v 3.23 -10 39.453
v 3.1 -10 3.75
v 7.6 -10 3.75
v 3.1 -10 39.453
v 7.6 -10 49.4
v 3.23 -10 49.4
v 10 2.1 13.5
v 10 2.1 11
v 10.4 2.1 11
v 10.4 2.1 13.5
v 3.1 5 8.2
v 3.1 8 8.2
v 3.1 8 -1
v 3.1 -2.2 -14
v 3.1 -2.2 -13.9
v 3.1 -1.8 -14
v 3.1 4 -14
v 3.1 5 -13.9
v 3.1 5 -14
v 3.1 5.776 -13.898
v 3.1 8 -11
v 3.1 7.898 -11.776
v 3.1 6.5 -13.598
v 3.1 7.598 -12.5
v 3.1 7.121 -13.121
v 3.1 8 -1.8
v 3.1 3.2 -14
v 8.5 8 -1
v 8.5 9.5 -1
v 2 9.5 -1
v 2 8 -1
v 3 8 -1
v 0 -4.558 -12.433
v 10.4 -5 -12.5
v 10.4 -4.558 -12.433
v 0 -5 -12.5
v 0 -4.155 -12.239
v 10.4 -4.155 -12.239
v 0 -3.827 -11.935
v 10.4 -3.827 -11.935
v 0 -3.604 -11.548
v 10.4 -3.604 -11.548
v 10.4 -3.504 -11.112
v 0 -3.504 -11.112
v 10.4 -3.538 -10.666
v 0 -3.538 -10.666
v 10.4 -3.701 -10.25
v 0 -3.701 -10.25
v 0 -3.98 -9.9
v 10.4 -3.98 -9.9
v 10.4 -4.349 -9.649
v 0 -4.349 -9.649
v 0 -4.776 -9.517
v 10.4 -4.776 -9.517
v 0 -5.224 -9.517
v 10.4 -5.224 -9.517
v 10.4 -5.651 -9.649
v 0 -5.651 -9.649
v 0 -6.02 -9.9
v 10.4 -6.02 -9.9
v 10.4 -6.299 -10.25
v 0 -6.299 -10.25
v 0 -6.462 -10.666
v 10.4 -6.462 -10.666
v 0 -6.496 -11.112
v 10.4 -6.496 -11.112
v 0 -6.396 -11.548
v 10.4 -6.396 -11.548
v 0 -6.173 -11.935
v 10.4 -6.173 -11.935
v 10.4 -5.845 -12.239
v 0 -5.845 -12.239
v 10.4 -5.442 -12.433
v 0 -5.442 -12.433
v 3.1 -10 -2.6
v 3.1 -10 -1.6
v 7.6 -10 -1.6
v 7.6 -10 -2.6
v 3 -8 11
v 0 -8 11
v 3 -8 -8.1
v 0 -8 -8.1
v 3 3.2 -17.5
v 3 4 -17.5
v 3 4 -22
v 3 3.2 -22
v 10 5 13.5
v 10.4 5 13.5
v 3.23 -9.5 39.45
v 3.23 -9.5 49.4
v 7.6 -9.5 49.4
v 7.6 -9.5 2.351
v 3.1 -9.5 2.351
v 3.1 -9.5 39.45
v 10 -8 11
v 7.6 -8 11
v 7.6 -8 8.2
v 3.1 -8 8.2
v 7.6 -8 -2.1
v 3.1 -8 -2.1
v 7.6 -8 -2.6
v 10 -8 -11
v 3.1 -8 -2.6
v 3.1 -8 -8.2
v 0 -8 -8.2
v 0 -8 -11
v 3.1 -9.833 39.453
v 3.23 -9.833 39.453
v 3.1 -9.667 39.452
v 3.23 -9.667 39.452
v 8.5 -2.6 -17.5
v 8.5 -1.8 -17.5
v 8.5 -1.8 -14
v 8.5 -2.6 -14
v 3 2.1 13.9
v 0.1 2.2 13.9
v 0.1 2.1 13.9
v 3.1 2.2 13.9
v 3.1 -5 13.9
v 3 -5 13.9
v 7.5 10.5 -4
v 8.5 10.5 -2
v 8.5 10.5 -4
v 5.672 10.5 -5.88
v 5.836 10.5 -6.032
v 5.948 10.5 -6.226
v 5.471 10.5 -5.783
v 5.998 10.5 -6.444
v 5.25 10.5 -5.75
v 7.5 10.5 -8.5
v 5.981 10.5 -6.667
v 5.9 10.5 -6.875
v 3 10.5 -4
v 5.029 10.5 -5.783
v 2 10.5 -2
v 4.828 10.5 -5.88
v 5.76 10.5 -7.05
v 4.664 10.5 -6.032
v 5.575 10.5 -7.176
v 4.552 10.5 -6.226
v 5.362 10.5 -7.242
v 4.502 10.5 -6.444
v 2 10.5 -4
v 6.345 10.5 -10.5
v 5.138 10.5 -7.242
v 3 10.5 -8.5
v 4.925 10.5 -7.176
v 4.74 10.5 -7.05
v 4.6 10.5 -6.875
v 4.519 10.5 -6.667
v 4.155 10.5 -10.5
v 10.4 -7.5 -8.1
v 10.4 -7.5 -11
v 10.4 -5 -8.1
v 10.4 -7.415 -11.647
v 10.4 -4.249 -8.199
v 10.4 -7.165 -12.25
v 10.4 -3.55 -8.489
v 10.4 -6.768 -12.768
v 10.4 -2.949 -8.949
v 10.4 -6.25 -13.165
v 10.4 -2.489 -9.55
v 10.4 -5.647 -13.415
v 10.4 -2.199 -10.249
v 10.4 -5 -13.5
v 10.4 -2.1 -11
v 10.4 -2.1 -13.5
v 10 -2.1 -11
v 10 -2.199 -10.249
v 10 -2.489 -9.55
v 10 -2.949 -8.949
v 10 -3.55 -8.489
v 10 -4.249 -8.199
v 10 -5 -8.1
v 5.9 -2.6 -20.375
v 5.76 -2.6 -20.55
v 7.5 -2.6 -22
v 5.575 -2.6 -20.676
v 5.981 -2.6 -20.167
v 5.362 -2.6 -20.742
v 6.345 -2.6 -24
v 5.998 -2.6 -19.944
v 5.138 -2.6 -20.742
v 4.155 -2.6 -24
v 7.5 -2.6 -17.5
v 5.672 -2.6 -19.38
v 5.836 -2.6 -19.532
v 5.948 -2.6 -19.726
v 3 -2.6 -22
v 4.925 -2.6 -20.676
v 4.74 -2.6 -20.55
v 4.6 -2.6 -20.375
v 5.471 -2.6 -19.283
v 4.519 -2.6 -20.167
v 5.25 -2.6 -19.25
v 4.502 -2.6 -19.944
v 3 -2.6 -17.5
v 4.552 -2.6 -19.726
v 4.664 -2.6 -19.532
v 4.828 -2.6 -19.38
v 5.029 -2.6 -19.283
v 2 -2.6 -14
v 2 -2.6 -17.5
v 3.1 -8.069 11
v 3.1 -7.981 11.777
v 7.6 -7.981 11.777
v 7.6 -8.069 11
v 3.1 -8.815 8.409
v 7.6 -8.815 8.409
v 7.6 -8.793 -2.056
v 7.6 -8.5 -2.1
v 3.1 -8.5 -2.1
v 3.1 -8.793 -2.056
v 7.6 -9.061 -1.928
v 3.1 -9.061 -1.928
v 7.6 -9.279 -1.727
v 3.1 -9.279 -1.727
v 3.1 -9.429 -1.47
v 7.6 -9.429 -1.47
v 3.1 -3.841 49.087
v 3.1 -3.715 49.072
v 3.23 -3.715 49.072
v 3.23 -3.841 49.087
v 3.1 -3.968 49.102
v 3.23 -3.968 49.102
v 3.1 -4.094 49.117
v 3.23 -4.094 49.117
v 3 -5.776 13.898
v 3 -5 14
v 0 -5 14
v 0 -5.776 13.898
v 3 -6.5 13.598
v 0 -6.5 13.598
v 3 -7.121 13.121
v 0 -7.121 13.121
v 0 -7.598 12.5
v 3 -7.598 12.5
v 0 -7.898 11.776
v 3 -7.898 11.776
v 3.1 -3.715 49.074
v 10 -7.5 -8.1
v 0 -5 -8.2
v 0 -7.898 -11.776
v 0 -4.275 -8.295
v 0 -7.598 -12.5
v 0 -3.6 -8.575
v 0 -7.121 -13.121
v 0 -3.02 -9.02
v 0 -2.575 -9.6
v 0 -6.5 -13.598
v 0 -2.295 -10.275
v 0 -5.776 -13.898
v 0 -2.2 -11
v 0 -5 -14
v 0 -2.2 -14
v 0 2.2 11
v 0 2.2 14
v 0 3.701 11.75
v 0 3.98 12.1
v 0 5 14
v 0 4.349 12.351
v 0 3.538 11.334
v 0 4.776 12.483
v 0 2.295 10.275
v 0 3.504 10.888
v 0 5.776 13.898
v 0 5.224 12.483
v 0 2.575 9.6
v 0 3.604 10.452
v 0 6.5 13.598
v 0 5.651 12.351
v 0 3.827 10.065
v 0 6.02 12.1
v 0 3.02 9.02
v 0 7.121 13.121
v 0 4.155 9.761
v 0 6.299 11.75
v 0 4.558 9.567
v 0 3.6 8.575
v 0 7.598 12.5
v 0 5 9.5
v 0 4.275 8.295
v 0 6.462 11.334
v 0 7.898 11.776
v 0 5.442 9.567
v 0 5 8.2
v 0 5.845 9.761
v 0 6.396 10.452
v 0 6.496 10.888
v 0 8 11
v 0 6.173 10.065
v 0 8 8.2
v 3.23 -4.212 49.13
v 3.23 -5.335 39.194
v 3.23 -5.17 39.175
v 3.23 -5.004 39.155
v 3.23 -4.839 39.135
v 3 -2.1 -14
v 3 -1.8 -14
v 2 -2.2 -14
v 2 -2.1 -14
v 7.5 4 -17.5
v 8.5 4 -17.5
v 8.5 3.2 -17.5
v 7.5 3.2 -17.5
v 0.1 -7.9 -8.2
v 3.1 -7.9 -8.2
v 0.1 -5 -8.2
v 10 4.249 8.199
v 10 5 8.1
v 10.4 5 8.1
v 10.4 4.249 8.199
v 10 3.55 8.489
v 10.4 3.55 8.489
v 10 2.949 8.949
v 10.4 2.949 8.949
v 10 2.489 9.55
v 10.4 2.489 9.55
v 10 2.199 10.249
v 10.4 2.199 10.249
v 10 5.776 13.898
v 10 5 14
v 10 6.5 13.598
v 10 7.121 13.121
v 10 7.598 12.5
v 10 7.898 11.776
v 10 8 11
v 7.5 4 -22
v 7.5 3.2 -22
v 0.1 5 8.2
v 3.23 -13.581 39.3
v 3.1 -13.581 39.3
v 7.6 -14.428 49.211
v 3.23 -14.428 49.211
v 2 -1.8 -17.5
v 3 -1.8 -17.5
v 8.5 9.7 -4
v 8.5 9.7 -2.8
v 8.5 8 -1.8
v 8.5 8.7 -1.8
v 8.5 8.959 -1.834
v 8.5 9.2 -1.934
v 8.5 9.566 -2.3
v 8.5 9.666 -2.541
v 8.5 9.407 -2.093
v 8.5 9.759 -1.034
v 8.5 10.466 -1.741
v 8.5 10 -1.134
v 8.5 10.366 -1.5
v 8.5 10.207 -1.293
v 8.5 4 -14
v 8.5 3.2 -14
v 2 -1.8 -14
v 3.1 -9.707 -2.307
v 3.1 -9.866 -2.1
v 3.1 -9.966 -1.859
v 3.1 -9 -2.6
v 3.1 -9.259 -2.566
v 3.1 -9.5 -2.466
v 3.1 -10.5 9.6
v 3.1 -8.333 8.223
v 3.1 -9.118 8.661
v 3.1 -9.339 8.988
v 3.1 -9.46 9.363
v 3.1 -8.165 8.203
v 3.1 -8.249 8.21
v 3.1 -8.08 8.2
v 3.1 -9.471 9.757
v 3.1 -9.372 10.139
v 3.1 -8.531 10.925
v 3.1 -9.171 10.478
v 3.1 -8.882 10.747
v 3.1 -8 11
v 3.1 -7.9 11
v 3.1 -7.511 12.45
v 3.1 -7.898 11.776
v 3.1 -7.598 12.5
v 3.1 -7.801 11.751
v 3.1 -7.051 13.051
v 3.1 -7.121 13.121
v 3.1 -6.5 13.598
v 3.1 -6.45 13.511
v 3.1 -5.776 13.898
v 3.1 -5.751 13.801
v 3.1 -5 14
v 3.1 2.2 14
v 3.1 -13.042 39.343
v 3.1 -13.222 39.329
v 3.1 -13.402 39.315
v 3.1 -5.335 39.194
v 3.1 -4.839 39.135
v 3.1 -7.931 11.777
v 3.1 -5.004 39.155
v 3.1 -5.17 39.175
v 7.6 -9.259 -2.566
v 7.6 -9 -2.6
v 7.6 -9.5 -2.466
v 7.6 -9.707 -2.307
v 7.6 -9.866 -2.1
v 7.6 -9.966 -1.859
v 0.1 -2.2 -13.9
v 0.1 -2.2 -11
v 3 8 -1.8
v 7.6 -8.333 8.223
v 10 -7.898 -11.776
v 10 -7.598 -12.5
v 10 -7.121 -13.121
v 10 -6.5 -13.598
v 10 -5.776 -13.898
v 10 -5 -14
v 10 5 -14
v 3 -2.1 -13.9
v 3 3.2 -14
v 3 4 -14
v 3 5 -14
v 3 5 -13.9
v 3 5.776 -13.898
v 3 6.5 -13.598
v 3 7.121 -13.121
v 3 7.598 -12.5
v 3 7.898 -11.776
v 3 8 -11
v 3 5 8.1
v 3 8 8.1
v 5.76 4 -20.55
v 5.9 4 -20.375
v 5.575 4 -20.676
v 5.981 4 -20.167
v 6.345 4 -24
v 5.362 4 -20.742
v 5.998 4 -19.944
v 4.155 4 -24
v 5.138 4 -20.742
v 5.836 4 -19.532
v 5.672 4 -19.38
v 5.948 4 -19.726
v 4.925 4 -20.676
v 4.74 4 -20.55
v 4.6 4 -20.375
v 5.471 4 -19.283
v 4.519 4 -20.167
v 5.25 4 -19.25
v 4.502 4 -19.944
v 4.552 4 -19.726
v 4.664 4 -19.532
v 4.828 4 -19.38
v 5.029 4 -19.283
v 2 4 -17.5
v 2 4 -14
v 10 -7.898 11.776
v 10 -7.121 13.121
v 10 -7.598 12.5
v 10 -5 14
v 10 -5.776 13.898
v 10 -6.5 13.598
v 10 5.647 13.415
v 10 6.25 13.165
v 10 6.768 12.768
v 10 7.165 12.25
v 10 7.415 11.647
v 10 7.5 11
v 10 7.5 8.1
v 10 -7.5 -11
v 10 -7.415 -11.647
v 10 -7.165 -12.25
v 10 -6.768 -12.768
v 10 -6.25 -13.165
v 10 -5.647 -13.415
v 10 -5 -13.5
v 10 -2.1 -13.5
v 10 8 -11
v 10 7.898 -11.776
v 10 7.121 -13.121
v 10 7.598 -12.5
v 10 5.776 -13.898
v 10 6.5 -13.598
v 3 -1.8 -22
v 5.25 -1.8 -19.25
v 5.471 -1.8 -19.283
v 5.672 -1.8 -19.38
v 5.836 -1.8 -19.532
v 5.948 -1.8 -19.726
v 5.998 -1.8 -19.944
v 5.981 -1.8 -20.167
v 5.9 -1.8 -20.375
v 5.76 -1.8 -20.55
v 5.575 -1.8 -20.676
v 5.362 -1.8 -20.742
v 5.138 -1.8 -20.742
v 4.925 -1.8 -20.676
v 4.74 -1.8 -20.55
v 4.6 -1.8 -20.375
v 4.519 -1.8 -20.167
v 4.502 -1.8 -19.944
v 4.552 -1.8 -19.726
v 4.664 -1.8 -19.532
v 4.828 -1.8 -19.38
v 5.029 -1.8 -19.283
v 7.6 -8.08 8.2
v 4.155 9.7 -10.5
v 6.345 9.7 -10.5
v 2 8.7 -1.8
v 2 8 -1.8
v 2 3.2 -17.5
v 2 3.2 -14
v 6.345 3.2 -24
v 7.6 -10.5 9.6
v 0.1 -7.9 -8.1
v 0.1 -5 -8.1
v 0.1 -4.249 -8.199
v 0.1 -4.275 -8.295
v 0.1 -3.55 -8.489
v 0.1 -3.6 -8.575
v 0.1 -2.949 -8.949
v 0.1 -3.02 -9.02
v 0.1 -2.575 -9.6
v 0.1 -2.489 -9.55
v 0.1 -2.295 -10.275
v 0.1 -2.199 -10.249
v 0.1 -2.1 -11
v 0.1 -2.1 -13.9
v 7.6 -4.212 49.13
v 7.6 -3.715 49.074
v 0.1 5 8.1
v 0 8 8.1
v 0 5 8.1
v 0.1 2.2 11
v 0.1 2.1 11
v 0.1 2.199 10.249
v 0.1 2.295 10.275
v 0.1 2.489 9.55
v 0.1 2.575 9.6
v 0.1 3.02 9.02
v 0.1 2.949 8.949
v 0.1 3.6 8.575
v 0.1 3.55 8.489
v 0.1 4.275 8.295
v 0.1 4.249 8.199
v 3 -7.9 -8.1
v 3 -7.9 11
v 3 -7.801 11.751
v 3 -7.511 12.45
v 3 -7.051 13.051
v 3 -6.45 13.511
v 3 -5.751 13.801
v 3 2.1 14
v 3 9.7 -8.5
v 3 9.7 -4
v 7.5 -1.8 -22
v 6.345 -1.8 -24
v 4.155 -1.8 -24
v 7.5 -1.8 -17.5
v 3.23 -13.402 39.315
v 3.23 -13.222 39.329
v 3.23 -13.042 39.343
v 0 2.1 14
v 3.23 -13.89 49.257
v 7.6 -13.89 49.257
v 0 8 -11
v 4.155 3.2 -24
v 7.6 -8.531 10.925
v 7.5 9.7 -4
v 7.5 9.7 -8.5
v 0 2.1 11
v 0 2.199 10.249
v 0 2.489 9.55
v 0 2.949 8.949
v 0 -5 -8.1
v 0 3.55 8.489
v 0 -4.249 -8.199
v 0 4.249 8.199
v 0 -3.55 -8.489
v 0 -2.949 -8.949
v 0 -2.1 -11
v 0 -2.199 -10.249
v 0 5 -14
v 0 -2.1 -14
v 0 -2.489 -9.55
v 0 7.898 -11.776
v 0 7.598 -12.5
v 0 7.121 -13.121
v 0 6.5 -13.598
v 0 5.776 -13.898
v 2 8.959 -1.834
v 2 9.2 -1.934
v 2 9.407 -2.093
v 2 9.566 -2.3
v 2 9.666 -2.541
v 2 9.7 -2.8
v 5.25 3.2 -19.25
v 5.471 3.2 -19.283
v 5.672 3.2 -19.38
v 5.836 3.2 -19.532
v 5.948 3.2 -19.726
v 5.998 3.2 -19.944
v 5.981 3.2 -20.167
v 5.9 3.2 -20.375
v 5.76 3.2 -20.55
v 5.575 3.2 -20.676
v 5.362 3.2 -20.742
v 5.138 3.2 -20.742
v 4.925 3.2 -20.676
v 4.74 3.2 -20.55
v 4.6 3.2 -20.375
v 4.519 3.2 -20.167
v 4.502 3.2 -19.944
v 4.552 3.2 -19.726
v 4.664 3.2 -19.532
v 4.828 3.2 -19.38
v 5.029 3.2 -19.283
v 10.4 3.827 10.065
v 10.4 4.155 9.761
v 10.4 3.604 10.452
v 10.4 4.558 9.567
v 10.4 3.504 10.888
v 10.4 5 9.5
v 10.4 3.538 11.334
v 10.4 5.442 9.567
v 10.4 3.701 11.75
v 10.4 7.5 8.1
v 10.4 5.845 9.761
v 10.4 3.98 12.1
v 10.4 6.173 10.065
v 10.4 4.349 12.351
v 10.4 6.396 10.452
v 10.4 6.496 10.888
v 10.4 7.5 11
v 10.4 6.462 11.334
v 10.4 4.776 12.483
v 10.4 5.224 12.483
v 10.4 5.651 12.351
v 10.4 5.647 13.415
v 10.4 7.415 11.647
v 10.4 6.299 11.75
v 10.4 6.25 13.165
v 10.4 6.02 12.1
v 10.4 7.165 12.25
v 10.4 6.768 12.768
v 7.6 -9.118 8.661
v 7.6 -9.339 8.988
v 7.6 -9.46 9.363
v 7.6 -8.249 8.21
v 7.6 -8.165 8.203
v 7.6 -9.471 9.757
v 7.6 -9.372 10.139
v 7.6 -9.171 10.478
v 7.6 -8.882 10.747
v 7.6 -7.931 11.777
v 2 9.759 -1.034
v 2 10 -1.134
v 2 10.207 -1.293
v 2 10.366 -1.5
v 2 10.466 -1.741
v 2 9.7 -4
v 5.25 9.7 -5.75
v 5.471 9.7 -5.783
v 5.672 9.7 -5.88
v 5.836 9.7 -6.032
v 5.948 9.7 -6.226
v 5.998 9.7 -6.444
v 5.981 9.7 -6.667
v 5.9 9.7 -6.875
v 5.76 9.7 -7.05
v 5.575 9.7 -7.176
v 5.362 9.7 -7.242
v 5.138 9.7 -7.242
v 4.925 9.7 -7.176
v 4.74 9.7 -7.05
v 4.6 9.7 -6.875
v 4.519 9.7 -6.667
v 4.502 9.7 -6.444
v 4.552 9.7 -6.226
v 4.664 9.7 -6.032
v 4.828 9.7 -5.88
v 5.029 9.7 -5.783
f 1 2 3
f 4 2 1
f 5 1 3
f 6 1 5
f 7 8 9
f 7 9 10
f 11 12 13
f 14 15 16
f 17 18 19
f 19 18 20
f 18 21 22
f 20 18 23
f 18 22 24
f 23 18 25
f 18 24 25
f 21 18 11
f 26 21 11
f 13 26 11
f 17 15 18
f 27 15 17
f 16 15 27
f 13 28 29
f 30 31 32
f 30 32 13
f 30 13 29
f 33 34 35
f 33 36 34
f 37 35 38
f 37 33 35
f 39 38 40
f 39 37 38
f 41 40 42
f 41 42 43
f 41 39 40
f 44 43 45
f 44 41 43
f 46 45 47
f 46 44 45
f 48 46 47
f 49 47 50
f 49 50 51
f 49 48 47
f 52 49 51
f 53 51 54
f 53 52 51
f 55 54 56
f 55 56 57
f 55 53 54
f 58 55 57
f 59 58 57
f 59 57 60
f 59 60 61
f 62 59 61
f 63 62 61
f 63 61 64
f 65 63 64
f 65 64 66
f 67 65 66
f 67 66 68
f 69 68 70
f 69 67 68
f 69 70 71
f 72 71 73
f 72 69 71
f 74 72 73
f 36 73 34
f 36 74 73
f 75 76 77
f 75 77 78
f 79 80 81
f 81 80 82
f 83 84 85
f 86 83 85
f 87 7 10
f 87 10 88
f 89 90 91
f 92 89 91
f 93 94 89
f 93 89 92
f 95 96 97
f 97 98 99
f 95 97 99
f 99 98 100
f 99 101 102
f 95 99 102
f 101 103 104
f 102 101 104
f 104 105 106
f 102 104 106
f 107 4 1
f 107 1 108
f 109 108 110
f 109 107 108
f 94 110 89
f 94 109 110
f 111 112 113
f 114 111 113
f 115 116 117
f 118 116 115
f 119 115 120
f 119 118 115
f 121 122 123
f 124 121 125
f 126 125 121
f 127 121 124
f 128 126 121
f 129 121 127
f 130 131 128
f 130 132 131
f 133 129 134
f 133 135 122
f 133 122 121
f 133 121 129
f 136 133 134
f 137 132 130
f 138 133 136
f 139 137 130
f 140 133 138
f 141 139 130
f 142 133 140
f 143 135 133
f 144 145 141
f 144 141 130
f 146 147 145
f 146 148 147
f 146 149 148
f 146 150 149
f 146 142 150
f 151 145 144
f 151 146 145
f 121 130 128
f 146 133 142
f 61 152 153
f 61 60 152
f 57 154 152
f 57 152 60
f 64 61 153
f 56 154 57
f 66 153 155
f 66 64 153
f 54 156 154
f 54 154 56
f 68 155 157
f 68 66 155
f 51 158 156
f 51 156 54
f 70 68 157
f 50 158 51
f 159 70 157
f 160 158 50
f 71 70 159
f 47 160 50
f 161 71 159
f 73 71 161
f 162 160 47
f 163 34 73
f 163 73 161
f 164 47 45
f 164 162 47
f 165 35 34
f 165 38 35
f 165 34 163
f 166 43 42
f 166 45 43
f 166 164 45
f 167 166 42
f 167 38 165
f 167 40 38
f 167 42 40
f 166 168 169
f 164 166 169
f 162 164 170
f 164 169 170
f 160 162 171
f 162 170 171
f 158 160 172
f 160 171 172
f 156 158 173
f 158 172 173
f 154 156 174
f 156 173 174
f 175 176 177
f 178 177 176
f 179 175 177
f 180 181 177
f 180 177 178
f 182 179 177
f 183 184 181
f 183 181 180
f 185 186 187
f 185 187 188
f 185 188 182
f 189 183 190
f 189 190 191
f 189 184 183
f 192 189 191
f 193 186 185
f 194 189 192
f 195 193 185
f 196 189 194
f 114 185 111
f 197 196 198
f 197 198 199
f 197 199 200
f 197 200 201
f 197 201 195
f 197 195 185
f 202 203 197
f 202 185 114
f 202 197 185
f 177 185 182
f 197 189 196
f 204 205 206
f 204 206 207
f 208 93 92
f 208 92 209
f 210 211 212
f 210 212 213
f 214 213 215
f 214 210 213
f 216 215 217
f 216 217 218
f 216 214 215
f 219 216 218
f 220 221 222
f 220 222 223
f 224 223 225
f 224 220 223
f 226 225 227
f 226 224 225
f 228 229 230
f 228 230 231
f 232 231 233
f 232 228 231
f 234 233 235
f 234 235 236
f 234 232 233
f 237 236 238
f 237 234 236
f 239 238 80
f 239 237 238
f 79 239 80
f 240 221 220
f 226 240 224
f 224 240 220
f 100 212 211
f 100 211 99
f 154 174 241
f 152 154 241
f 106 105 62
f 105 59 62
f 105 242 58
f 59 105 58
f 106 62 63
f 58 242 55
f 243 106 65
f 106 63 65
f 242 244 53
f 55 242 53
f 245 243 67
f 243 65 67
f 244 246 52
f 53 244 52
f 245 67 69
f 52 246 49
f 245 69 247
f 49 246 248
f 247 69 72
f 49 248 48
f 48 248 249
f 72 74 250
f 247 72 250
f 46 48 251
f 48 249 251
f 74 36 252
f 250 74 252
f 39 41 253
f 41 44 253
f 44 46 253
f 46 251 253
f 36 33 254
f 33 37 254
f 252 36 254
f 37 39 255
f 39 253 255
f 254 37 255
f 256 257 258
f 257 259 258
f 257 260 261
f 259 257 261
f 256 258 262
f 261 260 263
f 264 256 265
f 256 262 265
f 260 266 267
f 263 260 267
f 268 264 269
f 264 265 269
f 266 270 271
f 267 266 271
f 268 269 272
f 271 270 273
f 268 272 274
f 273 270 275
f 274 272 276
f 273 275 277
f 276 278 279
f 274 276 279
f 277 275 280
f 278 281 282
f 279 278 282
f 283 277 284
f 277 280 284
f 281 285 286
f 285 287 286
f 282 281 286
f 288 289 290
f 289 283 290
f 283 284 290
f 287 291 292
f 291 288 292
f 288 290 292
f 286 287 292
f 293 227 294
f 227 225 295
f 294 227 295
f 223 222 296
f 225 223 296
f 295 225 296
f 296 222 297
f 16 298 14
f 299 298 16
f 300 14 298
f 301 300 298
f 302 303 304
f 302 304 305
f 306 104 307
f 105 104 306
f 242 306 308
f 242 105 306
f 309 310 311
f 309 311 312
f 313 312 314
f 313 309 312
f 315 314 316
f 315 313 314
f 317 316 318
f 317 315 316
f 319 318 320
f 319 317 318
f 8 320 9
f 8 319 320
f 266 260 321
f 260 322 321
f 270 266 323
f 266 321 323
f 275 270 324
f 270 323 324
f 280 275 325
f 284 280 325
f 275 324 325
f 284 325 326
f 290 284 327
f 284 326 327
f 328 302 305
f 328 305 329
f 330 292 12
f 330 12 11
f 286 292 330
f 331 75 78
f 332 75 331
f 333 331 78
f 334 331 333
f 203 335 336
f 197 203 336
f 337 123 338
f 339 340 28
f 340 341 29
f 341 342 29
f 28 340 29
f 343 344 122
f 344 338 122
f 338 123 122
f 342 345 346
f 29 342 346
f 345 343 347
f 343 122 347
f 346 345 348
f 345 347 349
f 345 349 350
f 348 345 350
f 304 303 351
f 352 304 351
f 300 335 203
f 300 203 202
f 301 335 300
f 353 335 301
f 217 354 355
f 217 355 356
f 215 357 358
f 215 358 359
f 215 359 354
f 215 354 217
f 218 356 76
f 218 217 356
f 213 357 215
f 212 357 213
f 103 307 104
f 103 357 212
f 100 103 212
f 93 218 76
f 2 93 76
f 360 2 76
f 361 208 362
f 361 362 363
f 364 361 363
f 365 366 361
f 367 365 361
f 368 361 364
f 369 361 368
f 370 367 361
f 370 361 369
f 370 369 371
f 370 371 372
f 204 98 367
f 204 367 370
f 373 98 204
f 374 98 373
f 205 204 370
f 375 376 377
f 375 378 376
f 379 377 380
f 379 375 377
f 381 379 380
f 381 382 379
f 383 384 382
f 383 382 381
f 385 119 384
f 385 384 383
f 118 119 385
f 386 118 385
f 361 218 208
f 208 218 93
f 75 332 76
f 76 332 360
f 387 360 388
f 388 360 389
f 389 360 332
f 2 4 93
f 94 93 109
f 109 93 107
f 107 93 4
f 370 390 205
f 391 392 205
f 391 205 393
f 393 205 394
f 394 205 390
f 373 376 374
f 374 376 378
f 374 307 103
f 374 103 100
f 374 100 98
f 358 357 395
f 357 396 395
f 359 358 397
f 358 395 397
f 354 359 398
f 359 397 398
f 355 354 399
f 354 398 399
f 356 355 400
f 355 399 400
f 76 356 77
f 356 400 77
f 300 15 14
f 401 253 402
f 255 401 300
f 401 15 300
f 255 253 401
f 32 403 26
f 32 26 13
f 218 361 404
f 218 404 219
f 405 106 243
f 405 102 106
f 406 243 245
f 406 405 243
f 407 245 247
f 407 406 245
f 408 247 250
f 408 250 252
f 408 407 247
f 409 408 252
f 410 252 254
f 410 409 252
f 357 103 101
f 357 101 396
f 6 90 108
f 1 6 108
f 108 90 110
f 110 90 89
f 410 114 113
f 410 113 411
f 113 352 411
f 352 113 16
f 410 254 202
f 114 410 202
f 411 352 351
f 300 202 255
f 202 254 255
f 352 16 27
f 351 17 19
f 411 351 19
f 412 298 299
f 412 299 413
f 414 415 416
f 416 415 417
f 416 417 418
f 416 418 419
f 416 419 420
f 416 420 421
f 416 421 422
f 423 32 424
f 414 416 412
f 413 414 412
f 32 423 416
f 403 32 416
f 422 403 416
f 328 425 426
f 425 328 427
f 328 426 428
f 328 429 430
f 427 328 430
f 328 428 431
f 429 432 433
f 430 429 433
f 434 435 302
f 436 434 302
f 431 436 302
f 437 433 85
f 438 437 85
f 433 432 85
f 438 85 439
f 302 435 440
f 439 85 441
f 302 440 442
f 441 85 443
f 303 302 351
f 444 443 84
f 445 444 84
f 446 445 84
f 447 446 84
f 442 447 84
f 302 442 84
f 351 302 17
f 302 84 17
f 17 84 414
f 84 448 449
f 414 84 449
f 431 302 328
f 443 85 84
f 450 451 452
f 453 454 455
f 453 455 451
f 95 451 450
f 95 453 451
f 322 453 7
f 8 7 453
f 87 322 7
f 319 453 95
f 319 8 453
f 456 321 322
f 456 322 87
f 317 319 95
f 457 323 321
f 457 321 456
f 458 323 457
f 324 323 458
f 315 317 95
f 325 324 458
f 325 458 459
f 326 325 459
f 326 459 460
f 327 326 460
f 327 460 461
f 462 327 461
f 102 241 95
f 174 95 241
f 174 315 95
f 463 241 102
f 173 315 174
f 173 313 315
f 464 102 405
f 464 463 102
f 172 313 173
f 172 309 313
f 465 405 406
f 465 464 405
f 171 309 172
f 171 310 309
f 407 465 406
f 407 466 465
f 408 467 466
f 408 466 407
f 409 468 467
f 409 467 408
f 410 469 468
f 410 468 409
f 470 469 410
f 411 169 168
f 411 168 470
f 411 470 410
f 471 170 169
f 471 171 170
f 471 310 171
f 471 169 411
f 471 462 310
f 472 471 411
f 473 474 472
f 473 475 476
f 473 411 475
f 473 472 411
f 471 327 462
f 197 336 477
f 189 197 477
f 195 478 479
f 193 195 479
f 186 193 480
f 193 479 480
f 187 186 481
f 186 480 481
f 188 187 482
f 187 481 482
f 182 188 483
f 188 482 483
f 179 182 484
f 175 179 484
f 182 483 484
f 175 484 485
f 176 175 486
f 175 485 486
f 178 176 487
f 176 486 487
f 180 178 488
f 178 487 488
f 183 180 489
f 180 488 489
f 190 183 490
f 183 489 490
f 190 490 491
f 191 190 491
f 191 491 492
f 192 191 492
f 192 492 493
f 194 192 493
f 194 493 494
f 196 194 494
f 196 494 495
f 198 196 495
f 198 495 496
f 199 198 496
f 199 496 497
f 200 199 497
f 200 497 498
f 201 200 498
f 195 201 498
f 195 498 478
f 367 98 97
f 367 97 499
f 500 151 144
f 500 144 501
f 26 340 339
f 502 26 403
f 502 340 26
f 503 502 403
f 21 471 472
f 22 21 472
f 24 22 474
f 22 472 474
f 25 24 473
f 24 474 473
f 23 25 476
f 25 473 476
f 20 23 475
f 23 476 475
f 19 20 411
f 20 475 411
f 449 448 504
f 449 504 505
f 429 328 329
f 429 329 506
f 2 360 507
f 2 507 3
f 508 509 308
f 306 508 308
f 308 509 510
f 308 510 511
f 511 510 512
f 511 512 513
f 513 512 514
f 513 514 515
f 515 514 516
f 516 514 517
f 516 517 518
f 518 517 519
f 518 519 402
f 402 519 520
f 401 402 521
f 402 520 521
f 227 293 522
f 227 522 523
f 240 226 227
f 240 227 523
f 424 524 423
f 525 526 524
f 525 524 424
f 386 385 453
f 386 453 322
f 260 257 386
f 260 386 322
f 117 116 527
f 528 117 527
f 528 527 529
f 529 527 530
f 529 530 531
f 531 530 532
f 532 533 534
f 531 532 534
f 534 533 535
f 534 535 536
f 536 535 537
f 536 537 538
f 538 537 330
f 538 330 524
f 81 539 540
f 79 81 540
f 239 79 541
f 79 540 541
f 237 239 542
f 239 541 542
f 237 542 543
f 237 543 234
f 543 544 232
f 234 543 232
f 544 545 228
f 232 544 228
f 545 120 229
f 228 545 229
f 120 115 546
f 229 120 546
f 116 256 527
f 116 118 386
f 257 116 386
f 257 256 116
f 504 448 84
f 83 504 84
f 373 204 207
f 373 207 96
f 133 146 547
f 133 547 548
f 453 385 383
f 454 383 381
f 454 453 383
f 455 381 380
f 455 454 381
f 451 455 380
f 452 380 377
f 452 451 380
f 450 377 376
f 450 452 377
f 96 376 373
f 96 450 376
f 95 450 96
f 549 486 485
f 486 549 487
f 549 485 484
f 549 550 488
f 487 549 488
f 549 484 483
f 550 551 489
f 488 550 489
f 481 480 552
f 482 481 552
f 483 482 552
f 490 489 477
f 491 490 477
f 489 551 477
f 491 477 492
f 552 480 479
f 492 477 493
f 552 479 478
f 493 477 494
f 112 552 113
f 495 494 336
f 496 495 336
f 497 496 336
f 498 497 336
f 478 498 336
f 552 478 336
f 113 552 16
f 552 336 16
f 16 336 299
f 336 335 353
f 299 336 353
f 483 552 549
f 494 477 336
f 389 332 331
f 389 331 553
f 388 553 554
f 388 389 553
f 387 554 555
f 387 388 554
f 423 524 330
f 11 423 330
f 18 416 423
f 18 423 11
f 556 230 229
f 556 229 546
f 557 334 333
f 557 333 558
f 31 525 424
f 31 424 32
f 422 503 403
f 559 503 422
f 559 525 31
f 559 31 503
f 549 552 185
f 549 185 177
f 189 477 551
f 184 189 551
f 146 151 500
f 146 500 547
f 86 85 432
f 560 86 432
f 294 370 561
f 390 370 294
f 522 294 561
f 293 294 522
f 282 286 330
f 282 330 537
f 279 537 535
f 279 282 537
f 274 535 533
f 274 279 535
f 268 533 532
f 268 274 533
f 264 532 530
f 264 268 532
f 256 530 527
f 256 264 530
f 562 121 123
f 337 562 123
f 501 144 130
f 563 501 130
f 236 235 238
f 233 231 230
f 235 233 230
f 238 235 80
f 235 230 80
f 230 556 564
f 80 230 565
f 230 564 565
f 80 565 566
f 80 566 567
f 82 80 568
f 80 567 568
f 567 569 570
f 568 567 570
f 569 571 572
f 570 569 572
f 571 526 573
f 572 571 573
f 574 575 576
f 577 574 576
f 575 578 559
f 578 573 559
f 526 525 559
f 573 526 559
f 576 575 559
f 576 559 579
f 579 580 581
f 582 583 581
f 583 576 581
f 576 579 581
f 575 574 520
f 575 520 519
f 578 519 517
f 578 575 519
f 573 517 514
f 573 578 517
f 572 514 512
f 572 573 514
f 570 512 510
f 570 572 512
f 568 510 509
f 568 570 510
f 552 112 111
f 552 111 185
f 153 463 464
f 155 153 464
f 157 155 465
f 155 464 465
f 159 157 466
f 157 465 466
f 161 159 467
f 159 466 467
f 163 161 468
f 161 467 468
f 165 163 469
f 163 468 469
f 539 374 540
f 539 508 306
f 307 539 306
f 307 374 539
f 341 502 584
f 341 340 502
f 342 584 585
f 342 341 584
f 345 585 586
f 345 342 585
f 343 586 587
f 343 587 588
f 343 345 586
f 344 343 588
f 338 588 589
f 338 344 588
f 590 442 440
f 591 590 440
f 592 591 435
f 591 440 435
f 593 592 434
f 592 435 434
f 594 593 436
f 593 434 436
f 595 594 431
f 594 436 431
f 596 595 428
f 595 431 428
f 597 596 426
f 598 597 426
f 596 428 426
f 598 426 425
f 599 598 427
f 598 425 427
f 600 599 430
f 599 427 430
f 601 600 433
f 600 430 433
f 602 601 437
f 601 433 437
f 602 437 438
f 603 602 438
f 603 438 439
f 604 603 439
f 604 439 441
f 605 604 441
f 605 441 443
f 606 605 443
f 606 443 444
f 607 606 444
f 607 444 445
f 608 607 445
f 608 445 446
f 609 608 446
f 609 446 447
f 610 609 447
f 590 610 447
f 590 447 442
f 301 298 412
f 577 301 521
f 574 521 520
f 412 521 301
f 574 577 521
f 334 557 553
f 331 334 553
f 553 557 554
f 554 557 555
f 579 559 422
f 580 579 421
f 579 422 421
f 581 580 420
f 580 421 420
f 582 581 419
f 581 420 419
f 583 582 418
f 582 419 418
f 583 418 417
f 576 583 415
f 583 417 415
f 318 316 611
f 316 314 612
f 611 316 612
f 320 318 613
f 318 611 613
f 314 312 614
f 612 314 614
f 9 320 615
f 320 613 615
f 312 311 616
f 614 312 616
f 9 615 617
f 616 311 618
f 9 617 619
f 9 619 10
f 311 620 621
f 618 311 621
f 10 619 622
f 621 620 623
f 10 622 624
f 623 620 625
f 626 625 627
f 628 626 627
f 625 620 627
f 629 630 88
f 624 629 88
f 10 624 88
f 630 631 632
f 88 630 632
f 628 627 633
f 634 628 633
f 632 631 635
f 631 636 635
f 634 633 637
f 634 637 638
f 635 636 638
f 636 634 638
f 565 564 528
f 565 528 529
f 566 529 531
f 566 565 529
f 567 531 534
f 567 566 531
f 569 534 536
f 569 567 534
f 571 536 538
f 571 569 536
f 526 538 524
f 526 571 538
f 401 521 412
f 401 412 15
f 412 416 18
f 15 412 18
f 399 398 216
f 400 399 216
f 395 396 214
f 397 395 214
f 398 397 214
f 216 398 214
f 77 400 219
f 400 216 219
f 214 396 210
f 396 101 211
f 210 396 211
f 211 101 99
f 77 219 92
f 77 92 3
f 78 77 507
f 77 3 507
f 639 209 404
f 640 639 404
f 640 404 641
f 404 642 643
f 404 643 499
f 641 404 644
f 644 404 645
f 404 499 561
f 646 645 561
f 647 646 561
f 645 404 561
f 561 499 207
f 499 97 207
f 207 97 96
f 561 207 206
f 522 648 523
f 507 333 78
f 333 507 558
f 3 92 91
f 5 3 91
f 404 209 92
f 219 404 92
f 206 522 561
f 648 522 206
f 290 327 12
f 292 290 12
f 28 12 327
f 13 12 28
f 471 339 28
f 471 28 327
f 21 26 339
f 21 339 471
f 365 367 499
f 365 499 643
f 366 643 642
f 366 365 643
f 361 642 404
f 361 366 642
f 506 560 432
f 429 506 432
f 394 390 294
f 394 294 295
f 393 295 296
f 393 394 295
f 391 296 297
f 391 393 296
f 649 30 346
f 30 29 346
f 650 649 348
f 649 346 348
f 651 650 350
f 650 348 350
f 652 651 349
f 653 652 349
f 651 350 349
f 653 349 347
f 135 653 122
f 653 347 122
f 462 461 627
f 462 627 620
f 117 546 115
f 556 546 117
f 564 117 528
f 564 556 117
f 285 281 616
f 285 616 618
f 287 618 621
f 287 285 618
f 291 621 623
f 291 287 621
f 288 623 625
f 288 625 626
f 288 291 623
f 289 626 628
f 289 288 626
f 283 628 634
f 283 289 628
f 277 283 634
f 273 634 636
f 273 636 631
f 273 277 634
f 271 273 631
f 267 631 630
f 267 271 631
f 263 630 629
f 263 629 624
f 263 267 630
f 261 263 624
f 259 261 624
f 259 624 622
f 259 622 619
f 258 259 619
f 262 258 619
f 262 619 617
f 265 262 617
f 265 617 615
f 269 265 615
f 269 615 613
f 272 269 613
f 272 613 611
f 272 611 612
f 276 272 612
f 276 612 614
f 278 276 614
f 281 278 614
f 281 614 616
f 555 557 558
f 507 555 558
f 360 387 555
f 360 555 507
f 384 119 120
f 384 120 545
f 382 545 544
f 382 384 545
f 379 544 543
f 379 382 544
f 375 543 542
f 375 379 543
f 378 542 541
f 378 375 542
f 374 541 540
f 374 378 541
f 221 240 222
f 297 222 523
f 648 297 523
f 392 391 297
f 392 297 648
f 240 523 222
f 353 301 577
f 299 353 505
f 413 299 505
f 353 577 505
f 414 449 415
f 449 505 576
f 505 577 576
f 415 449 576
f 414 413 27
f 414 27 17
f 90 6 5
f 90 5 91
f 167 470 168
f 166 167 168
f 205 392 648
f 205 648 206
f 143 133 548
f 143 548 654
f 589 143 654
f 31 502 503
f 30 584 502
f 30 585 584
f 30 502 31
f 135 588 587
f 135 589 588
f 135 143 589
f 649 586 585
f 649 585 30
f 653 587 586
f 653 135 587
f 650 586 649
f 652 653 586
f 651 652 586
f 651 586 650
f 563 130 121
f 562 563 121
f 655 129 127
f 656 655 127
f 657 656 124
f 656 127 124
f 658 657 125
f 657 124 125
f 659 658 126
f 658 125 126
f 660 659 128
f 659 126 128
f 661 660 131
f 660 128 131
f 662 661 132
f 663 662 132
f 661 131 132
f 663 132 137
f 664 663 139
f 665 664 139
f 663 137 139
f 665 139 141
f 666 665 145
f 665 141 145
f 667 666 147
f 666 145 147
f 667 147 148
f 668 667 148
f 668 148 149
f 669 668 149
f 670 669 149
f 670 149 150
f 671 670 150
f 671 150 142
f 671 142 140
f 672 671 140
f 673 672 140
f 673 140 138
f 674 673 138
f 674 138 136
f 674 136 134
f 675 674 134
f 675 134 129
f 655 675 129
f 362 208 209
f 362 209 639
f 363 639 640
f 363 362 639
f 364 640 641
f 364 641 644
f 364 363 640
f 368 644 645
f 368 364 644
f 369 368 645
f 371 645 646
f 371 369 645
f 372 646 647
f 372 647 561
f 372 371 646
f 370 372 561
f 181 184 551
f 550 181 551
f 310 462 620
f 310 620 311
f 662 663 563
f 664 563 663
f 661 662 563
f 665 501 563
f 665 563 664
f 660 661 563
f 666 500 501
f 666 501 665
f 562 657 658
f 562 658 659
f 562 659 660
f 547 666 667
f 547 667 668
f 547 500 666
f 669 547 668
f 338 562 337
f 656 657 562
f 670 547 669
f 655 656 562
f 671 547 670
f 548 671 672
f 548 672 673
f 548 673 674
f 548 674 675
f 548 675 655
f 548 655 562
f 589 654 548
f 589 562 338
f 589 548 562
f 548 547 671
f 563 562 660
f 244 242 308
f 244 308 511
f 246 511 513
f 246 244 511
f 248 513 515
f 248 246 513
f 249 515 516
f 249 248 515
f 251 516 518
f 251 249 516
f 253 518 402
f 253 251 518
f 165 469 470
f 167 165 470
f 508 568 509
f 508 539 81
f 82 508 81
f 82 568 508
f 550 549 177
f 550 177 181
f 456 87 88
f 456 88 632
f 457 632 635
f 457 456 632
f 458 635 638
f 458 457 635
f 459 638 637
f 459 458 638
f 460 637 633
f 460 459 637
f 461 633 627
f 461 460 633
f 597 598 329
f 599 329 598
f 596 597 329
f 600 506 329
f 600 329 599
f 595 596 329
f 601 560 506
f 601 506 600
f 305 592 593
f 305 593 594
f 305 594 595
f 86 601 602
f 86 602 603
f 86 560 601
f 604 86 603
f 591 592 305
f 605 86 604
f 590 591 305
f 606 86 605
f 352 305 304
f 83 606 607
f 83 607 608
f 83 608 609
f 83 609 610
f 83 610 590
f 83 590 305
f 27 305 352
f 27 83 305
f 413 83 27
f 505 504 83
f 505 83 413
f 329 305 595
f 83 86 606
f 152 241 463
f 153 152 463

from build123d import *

# Parameters (mm, degrees)
SKETCH_1_W          = 28
SKETCH_1_H          = 16
SKETCH_1_R          = 1.5
EXTRUDE_1_DEPTH     = 10
FILLET_1_R          = 3
SKETCH_2_R          = 1.5
EXTRUDE_2_DEPTH     = 0.4
CUT_EXTRUDE_1_DEPTH = 0.1
CUT_EXTRUDE_2_DEPTH = 3
CUT_EXTRUDE_3_DEPTH = 0.1
CUT_EXTRUDE_4_DEPTH = 0.1
SKETCH_7_W          = 2.9
SKETCH_7_H          = 0.1
CUT_EXTRUDE_5_DEPTH = 0.1
SKETCH_8_W          = 2.9
SKETCH_8_H          = 0.1
CUT_EXTRUDE_6_DEPTH = 0.1
EXTRUDE_3_DEPTH     = 4.5
SKETCH_11_W         = 10
SKETCH_11_H         = 0.8
EXTRUDE_4_DEPTH     = 6.5
SKETCH_12_R         = 0.75
CUT_EXTRUDE_7_DEPTH = 53.388166603
FILLET_2_R          = 1
SKETCH_13_R         = 0.75
CUT_EXTRUDE_8_DEPTH = 2
EXTRUDE_6_DEPTH     = 4.5
EXTRUDE_7_DEPTH     = 4.5
CUT_EXTRUDE_9_DEPTH = 0.13


with BuildPart() as part:
    # 草图1 → 凸台-拉伸1 (new body)
    with BuildSketch(Plane(origin=(0, 0, 0), x_dir=(0, 0, -1), z_dir=(1, 0, 0))):
        Rectangle(SKETCH_1_W, SKETCH_1_H)
        with Locations((11, -5)):
            Circle(SKETCH_1_R, mode=Mode.SUBTRACT)
        with Locations((-11, 5)):
            Circle(SKETCH_1_R, mode=Mode.SUBTRACT)
    extrude(amount=EXTRUDE_1_DEPTH)

    # 圆角1
    fillet_1_edges = [part.edges().sort_by_distance(p)[0] for p in [
        (5, 8, 14),
        (5, 8, -14),
        (5, -8, -14),
        (5, -8, 14),
    ]]
    fillet(fillet_1_edges, radius=FILLET_1_R)

    # 草图2 → 凸台-拉伸2 (add)
    # profile 1 of 2: a face of its own
    with BuildSketch(Plane(origin=(10, 0, 0), x_dir=(0, 0, -1), z_dir=(1, 0, 0))):
        with BuildLine():
            Line((13.5, -5), (13.5, -2.1))
            Line((13.5, -2.1), (11, -2.1))
            ThreePointArc((11, -2.1), (8.949390335, -2.949390335), (8.1, -5))
            Line((8.1, -5), (8.1, -7.5))
            Line((8.1, -7.5), (11, -7.5))
            ThreePointArc((11, -7.5), (12.767766953, -6.767766953), (13.5, -5))
        make_face()
        with Locations((11, -5)):
            Circle(SKETCH_2_R, mode=Mode.SUBTRACT)
    # profile 2 of 2: a face of its own
    with BuildSketch(Plane(origin=(10, 0, 0), x_dir=(0, 0, -1), z_dir=(1, 0, 0))):
        with BuildLine():
            Line((-11, 2.1), (-13.5, 2.1))
            Line((-13.5, 2.1), (-13.5, 5))
            ThreePointArc((-13.5, 5), (-12.767766953, 6.767766953), (-11, 7.5))
            Line((-11, 7.5), (-8.1, 7.5))
            Line((-8.1, 7.5), (-8.1, 5))
            ThreePointArc((-8.1, 5), (-8.949390335, 2.949390335), (-11, 2.1))
        make_face()
        with Locations((-11, 5)):
            Circle(SKETCH_2_R, mode=Mode.SUBTRACT)
    extrude(amount=EXTRUDE_2_DEPTH)

    # 草图3 → 切除-拉伸1 (cut)
    with BuildSketch(Plane.ZY):
        with BuildLine():
            Line((-13.5, -2.1), (-11, -2.1))
            ThreePointArc((-11, -2.1), (-8.949390335, -2.949390335), (-8.1, -5))
            Line((-8.1, -5), (-8.1, -7.5))
            Line((-8.1, -7.5), (-8.1, -8))
            Line((-8.1, -8), (-8.2, -8))
            Line((-8.2, -8), (-8.2, -7.5))
            Line((-8.2, -7.5), (-8.2, -5))
            ThreePointArc((-8.2, -5), (-9.020101013, -3.020101013), (-11, -2.2))
            Line((-11, -2.2), (-13.5, -2.2))
            Line((-13.5, -2.2), (-14, -2.2))
            Line((-14, -2.2), (-14, -2.1))
            Line((-14, -2.1), (-13.5, -2.1))
        make_face()
        with BuildLine():
            Line((13.5, 2.1), (11, 2.1))
            ThreePointArc((11, 2.1), (8.949390335, 2.949390335), (8.1, 5))
            Line((8.1, 5), (8.1, 7.5))
            Line((8.1, 7.5), (8.1, 8))
            Line((8.1, 8), (8.2, 8))
            Line((8.2, 8), (8.2, 7.5))
            Line((8.2, 7.5), (8.2, 5))
            ThreePointArc((8.2, 5), (9.020101013, 3.020101013), (11, 2.2))
            Line((11, 2.2), (13.5, 2.2))
            Line((13.5, 2.2), (14, 2.2))
            Line((14, 2.2), (14, 2.1))
            Line((14, 2.1), (13.5, 2.1))
        make_face()
    extrude(amount=-CUT_EXTRUDE_1_DEPTH, mode=Mode.SUBTRACT)

    # 草图4 → 切除-拉伸2 (cut)
    with BuildSketch(Plane(origin=(0, 8, 0), x_dir=(1, 0, 0), z_dir=(0, 1, 0))):
        Polygon((0, -8.2), (3.1, -8.2), (3.1, 14), (3, 14), (3, -8.1), (0, -8.1), align=None)
    extrude(amount=-CUT_EXTRUDE_2_DEPTH, mode=Mode.SUBTRACT)

    # 草图5 → 切除-拉伸3 (cut)
    with BuildSketch(Plane(origin=(0, 0, -14), x_dir=(-1, 0, 0), z_dir=(0, 0, -1))):
        Polygon((-3, 5), (-3, -2.1), (-0.1, -2.1), (-0.1, -2.2), (-3.1, -2.2), (-3.1, 5), align=None)
    extrude(amount=-CUT_EXTRUDE_3_DEPTH, mode=Mode.SUBTRACT)

    # 草图6 → 切除-拉伸4 (cut)
    with BuildSketch(Plane.ZY.offset(-3.1)):
        with BuildLine():
            Line((-8.2, -8), (11, -8))
            ThreePointArc((11, -8), (13.121320344, -7.121320344), (14, -5))
            Line((14, -5), (14, 2.1))
            Line((14, 2.1), (14, 2.2))
            Line((14, 2.2), (13.9, 2.2))
            Line((13.9, 2.2), (13.9, 2.1))
            Line((13.9, 2.1), (13.9, -5))
            ThreePointArc((13.9, -5), (13.050609665, -7.050609665), (11, -7.9))
            Line((11, -7.9), (-8.2, -7.9))
            Line((-8.2, -7.9), (-8.2, -8))
        make_face()
    extrude(amount=CUT_EXTRUDE_4_DEPTH, mode=Mode.SUBTRACT)

    # 草图7 → 切除-拉伸5 (cut)
    with BuildSketch(Plane.XY.offset(14)):
        with Locations((1.55, 2.15)):
            Rectangle(SKETCH_7_W, SKETCH_7_H)
    extrude(amount=-CUT_EXTRUDE_5_DEPTH, mode=Mode.SUBTRACT)

    # 草图8 → 切除-拉伸6 (cut)
    with BuildSketch(Plane.XZ.offset(8)):
        with Locations((1.55, -8.15)):
            Rectangle(SKETCH_8_W, SKETCH_8_H)
    extrude(amount=-CUT_EXTRUDE_6_DEPTH, mode=Mode.SUBTRACT)

    # 草图10 → 凸台-拉伸3 (add)
    with BuildSketch(Plane.ZY.offset(-3.1)):
        Polygon((-2.6, -8), (-2.6, -10), (49.4, -10), (49.4, -9.5), (-2.1, -9.5), (-2.1, -8), align=None)
        with BuildLine():
            Line((11, -8.08), (11, -8))
            Line((11, -8), (8.2, -8))
            Line((8.2, -8), (8.2, -8.08))
            ThreePointArc((8.2, -8.08), (9.6, -9.48), (11, -8.08))
        make_face()
    extrude(amount=-EXTRUDE_3_DEPTH)

    # 草图11 → 凸台-拉伸4 (add)
    with BuildSketch(Plane.ZY.offset(-2)):
        with Locations((-19, 3.6)):
            Rectangle(SKETCH_11_W, SKETCH_11_H)
        with Locations((-19, -2.2)):
            Rectangle(SKETCH_11_W, SKETCH_11_H)
        Polygon((-1, 8), (-1, 10.5), (-10.5, 10.5), (-10.5, 9.7), (-1.8, 9.7), (-1.8, 8), align=None)
    extrude(amount=-EXTRUDE_4_DEPTH)

    # 草图12 → 切除-拉伸7 (cut, through all)
    with BuildSketch(Plane(origin=(0, 4, 0), x_dir=(1, 0, 0), z_dir=(0, 1, 0))):
        with Locations(Location((5.25, 20, 0), (0, 0, 270))):
            Circle(SKETCH_12_R)
        Polygon((2, 17.5), (3, 17.5), (3, 22), (4.154700538, 24), (3, 24), (2, 24), align=None)
        Polygon((8.5, 24), (8.5, 17.5), (7.5, 17.5), (7.5, 22), (6.345299462, 24), (7.5, 24), align=None)
    extrude(amount=-CUT_EXTRUDE_7_DEPTH, mode=Mode.SUBTRACT)

    # 圆角2
    fillet_2_edges = [part.edges().sort_by_distance(p)[0] for p in [
        (5.35, -10, -2.6),
        (5.35, -9.5, -2.1),
        (5.25, 9.7, -1.8),
        (5.25, 10.5, -1),
    ]]
    fillet(fillet_2_edges, radius=FILLET_2_R)

    # 草图13 → 切除-拉伸8 (cut)
    with BuildSketch(Plane(origin=(0, 10.5, 0), x_dir=(1, 0, 0), z_dir=(0, 1, 0))):
        with Locations(Location((5.25, 6.5, 0), (0, 0, 270))):
            Circle(SKETCH_13_R)
        Polygon((8.5, 10.5), (6.345299462, 10.5), (7.5, 8.5), (7.5, 4), (8.5, 4), align=None)
        Polygon((3, 4), (2, 4), (2, 10.5), (4.154700538, 10.5), (3, 8.5), align=None)
    extrude(amount=-CUT_EXTRUDE_8_DEPTH, mode=Mode.SUBTRACT)

    # 草图10<5> → 凸台-拉伸6 (add)
    with BuildSketch(Plane.ZY.offset(-3.1)):
        with BuildLine():
            Line((8.223055296, -8.333028221), (-2.1, -9.5))
            Line((-2.1, -9.5), (2.351181411, -9.5))
            Line((2.351181411, -9.5), (8.408603451, -8.815237556))
            ThreePointArc((8.408603451, -8.815237556), (8.293391543, -8.582766687), (8.223055296, -8.333028221))
        make_face()
        with BuildLine():
            ThreePointArc((11, -8.08), (10.981240109, -8.308420142), (10.925463198, -8.53071866))
            Line((10.925463198, -8.53071866), (49.130220738, -4.211854469))
            Line((49.130220738, -4.211854469), (49.074055873, -3.715018975))
            Line((49.074055873, -3.715018975), (11.77713938, -7.9312561))
            Line((11.77713938, -7.9312561), (11.77713938, -7.9812561))
            Line((11.77713938, -7.9812561), (11, -8.069107971))
            Line((11, -8.069107971), (11, -8.08))
        make_face()
    extrude(amount=-EXTRUDE_6_DEPTH)

    # 草图10<6> → 凸台-拉伸7 (add)
    with BuildSketch(Plane.ZY.offset(-3.1)):
        Polygon((3.75, -10), (-2.6, -10), (49.2111008, -14.428299214), (49.257152, -13.889500171), (9.6, -10.5), align=None)
    extrude(amount=-EXTRUDE_7_DEPTH)

    # 草图14 → 切除-拉伸9 (cut)
    with BuildSketch(Plane.ZY.offset(-3.1)):
        with BuildLine():
            Line((39.135085265, -4.838571826), (49.072235928, -3.715224711))
            ThreePointArc((49.072235928, -3.715224711), (49.444709047, -9.069072224), (49.263942313, -14.432815582))
            Line((49.263942313, -14.432815582), (39.300269083, -13.58121958))
            ThreePointArc((39.300269083, -13.58121958), (39.445530044, -9.205590645), (39.135085265, -4.838571826))
        make_face()
    extrude(amount=-CUT_EXTRUDE_9_DEPTH, mode=Mode.SUBTRACT)


solid = part.part
